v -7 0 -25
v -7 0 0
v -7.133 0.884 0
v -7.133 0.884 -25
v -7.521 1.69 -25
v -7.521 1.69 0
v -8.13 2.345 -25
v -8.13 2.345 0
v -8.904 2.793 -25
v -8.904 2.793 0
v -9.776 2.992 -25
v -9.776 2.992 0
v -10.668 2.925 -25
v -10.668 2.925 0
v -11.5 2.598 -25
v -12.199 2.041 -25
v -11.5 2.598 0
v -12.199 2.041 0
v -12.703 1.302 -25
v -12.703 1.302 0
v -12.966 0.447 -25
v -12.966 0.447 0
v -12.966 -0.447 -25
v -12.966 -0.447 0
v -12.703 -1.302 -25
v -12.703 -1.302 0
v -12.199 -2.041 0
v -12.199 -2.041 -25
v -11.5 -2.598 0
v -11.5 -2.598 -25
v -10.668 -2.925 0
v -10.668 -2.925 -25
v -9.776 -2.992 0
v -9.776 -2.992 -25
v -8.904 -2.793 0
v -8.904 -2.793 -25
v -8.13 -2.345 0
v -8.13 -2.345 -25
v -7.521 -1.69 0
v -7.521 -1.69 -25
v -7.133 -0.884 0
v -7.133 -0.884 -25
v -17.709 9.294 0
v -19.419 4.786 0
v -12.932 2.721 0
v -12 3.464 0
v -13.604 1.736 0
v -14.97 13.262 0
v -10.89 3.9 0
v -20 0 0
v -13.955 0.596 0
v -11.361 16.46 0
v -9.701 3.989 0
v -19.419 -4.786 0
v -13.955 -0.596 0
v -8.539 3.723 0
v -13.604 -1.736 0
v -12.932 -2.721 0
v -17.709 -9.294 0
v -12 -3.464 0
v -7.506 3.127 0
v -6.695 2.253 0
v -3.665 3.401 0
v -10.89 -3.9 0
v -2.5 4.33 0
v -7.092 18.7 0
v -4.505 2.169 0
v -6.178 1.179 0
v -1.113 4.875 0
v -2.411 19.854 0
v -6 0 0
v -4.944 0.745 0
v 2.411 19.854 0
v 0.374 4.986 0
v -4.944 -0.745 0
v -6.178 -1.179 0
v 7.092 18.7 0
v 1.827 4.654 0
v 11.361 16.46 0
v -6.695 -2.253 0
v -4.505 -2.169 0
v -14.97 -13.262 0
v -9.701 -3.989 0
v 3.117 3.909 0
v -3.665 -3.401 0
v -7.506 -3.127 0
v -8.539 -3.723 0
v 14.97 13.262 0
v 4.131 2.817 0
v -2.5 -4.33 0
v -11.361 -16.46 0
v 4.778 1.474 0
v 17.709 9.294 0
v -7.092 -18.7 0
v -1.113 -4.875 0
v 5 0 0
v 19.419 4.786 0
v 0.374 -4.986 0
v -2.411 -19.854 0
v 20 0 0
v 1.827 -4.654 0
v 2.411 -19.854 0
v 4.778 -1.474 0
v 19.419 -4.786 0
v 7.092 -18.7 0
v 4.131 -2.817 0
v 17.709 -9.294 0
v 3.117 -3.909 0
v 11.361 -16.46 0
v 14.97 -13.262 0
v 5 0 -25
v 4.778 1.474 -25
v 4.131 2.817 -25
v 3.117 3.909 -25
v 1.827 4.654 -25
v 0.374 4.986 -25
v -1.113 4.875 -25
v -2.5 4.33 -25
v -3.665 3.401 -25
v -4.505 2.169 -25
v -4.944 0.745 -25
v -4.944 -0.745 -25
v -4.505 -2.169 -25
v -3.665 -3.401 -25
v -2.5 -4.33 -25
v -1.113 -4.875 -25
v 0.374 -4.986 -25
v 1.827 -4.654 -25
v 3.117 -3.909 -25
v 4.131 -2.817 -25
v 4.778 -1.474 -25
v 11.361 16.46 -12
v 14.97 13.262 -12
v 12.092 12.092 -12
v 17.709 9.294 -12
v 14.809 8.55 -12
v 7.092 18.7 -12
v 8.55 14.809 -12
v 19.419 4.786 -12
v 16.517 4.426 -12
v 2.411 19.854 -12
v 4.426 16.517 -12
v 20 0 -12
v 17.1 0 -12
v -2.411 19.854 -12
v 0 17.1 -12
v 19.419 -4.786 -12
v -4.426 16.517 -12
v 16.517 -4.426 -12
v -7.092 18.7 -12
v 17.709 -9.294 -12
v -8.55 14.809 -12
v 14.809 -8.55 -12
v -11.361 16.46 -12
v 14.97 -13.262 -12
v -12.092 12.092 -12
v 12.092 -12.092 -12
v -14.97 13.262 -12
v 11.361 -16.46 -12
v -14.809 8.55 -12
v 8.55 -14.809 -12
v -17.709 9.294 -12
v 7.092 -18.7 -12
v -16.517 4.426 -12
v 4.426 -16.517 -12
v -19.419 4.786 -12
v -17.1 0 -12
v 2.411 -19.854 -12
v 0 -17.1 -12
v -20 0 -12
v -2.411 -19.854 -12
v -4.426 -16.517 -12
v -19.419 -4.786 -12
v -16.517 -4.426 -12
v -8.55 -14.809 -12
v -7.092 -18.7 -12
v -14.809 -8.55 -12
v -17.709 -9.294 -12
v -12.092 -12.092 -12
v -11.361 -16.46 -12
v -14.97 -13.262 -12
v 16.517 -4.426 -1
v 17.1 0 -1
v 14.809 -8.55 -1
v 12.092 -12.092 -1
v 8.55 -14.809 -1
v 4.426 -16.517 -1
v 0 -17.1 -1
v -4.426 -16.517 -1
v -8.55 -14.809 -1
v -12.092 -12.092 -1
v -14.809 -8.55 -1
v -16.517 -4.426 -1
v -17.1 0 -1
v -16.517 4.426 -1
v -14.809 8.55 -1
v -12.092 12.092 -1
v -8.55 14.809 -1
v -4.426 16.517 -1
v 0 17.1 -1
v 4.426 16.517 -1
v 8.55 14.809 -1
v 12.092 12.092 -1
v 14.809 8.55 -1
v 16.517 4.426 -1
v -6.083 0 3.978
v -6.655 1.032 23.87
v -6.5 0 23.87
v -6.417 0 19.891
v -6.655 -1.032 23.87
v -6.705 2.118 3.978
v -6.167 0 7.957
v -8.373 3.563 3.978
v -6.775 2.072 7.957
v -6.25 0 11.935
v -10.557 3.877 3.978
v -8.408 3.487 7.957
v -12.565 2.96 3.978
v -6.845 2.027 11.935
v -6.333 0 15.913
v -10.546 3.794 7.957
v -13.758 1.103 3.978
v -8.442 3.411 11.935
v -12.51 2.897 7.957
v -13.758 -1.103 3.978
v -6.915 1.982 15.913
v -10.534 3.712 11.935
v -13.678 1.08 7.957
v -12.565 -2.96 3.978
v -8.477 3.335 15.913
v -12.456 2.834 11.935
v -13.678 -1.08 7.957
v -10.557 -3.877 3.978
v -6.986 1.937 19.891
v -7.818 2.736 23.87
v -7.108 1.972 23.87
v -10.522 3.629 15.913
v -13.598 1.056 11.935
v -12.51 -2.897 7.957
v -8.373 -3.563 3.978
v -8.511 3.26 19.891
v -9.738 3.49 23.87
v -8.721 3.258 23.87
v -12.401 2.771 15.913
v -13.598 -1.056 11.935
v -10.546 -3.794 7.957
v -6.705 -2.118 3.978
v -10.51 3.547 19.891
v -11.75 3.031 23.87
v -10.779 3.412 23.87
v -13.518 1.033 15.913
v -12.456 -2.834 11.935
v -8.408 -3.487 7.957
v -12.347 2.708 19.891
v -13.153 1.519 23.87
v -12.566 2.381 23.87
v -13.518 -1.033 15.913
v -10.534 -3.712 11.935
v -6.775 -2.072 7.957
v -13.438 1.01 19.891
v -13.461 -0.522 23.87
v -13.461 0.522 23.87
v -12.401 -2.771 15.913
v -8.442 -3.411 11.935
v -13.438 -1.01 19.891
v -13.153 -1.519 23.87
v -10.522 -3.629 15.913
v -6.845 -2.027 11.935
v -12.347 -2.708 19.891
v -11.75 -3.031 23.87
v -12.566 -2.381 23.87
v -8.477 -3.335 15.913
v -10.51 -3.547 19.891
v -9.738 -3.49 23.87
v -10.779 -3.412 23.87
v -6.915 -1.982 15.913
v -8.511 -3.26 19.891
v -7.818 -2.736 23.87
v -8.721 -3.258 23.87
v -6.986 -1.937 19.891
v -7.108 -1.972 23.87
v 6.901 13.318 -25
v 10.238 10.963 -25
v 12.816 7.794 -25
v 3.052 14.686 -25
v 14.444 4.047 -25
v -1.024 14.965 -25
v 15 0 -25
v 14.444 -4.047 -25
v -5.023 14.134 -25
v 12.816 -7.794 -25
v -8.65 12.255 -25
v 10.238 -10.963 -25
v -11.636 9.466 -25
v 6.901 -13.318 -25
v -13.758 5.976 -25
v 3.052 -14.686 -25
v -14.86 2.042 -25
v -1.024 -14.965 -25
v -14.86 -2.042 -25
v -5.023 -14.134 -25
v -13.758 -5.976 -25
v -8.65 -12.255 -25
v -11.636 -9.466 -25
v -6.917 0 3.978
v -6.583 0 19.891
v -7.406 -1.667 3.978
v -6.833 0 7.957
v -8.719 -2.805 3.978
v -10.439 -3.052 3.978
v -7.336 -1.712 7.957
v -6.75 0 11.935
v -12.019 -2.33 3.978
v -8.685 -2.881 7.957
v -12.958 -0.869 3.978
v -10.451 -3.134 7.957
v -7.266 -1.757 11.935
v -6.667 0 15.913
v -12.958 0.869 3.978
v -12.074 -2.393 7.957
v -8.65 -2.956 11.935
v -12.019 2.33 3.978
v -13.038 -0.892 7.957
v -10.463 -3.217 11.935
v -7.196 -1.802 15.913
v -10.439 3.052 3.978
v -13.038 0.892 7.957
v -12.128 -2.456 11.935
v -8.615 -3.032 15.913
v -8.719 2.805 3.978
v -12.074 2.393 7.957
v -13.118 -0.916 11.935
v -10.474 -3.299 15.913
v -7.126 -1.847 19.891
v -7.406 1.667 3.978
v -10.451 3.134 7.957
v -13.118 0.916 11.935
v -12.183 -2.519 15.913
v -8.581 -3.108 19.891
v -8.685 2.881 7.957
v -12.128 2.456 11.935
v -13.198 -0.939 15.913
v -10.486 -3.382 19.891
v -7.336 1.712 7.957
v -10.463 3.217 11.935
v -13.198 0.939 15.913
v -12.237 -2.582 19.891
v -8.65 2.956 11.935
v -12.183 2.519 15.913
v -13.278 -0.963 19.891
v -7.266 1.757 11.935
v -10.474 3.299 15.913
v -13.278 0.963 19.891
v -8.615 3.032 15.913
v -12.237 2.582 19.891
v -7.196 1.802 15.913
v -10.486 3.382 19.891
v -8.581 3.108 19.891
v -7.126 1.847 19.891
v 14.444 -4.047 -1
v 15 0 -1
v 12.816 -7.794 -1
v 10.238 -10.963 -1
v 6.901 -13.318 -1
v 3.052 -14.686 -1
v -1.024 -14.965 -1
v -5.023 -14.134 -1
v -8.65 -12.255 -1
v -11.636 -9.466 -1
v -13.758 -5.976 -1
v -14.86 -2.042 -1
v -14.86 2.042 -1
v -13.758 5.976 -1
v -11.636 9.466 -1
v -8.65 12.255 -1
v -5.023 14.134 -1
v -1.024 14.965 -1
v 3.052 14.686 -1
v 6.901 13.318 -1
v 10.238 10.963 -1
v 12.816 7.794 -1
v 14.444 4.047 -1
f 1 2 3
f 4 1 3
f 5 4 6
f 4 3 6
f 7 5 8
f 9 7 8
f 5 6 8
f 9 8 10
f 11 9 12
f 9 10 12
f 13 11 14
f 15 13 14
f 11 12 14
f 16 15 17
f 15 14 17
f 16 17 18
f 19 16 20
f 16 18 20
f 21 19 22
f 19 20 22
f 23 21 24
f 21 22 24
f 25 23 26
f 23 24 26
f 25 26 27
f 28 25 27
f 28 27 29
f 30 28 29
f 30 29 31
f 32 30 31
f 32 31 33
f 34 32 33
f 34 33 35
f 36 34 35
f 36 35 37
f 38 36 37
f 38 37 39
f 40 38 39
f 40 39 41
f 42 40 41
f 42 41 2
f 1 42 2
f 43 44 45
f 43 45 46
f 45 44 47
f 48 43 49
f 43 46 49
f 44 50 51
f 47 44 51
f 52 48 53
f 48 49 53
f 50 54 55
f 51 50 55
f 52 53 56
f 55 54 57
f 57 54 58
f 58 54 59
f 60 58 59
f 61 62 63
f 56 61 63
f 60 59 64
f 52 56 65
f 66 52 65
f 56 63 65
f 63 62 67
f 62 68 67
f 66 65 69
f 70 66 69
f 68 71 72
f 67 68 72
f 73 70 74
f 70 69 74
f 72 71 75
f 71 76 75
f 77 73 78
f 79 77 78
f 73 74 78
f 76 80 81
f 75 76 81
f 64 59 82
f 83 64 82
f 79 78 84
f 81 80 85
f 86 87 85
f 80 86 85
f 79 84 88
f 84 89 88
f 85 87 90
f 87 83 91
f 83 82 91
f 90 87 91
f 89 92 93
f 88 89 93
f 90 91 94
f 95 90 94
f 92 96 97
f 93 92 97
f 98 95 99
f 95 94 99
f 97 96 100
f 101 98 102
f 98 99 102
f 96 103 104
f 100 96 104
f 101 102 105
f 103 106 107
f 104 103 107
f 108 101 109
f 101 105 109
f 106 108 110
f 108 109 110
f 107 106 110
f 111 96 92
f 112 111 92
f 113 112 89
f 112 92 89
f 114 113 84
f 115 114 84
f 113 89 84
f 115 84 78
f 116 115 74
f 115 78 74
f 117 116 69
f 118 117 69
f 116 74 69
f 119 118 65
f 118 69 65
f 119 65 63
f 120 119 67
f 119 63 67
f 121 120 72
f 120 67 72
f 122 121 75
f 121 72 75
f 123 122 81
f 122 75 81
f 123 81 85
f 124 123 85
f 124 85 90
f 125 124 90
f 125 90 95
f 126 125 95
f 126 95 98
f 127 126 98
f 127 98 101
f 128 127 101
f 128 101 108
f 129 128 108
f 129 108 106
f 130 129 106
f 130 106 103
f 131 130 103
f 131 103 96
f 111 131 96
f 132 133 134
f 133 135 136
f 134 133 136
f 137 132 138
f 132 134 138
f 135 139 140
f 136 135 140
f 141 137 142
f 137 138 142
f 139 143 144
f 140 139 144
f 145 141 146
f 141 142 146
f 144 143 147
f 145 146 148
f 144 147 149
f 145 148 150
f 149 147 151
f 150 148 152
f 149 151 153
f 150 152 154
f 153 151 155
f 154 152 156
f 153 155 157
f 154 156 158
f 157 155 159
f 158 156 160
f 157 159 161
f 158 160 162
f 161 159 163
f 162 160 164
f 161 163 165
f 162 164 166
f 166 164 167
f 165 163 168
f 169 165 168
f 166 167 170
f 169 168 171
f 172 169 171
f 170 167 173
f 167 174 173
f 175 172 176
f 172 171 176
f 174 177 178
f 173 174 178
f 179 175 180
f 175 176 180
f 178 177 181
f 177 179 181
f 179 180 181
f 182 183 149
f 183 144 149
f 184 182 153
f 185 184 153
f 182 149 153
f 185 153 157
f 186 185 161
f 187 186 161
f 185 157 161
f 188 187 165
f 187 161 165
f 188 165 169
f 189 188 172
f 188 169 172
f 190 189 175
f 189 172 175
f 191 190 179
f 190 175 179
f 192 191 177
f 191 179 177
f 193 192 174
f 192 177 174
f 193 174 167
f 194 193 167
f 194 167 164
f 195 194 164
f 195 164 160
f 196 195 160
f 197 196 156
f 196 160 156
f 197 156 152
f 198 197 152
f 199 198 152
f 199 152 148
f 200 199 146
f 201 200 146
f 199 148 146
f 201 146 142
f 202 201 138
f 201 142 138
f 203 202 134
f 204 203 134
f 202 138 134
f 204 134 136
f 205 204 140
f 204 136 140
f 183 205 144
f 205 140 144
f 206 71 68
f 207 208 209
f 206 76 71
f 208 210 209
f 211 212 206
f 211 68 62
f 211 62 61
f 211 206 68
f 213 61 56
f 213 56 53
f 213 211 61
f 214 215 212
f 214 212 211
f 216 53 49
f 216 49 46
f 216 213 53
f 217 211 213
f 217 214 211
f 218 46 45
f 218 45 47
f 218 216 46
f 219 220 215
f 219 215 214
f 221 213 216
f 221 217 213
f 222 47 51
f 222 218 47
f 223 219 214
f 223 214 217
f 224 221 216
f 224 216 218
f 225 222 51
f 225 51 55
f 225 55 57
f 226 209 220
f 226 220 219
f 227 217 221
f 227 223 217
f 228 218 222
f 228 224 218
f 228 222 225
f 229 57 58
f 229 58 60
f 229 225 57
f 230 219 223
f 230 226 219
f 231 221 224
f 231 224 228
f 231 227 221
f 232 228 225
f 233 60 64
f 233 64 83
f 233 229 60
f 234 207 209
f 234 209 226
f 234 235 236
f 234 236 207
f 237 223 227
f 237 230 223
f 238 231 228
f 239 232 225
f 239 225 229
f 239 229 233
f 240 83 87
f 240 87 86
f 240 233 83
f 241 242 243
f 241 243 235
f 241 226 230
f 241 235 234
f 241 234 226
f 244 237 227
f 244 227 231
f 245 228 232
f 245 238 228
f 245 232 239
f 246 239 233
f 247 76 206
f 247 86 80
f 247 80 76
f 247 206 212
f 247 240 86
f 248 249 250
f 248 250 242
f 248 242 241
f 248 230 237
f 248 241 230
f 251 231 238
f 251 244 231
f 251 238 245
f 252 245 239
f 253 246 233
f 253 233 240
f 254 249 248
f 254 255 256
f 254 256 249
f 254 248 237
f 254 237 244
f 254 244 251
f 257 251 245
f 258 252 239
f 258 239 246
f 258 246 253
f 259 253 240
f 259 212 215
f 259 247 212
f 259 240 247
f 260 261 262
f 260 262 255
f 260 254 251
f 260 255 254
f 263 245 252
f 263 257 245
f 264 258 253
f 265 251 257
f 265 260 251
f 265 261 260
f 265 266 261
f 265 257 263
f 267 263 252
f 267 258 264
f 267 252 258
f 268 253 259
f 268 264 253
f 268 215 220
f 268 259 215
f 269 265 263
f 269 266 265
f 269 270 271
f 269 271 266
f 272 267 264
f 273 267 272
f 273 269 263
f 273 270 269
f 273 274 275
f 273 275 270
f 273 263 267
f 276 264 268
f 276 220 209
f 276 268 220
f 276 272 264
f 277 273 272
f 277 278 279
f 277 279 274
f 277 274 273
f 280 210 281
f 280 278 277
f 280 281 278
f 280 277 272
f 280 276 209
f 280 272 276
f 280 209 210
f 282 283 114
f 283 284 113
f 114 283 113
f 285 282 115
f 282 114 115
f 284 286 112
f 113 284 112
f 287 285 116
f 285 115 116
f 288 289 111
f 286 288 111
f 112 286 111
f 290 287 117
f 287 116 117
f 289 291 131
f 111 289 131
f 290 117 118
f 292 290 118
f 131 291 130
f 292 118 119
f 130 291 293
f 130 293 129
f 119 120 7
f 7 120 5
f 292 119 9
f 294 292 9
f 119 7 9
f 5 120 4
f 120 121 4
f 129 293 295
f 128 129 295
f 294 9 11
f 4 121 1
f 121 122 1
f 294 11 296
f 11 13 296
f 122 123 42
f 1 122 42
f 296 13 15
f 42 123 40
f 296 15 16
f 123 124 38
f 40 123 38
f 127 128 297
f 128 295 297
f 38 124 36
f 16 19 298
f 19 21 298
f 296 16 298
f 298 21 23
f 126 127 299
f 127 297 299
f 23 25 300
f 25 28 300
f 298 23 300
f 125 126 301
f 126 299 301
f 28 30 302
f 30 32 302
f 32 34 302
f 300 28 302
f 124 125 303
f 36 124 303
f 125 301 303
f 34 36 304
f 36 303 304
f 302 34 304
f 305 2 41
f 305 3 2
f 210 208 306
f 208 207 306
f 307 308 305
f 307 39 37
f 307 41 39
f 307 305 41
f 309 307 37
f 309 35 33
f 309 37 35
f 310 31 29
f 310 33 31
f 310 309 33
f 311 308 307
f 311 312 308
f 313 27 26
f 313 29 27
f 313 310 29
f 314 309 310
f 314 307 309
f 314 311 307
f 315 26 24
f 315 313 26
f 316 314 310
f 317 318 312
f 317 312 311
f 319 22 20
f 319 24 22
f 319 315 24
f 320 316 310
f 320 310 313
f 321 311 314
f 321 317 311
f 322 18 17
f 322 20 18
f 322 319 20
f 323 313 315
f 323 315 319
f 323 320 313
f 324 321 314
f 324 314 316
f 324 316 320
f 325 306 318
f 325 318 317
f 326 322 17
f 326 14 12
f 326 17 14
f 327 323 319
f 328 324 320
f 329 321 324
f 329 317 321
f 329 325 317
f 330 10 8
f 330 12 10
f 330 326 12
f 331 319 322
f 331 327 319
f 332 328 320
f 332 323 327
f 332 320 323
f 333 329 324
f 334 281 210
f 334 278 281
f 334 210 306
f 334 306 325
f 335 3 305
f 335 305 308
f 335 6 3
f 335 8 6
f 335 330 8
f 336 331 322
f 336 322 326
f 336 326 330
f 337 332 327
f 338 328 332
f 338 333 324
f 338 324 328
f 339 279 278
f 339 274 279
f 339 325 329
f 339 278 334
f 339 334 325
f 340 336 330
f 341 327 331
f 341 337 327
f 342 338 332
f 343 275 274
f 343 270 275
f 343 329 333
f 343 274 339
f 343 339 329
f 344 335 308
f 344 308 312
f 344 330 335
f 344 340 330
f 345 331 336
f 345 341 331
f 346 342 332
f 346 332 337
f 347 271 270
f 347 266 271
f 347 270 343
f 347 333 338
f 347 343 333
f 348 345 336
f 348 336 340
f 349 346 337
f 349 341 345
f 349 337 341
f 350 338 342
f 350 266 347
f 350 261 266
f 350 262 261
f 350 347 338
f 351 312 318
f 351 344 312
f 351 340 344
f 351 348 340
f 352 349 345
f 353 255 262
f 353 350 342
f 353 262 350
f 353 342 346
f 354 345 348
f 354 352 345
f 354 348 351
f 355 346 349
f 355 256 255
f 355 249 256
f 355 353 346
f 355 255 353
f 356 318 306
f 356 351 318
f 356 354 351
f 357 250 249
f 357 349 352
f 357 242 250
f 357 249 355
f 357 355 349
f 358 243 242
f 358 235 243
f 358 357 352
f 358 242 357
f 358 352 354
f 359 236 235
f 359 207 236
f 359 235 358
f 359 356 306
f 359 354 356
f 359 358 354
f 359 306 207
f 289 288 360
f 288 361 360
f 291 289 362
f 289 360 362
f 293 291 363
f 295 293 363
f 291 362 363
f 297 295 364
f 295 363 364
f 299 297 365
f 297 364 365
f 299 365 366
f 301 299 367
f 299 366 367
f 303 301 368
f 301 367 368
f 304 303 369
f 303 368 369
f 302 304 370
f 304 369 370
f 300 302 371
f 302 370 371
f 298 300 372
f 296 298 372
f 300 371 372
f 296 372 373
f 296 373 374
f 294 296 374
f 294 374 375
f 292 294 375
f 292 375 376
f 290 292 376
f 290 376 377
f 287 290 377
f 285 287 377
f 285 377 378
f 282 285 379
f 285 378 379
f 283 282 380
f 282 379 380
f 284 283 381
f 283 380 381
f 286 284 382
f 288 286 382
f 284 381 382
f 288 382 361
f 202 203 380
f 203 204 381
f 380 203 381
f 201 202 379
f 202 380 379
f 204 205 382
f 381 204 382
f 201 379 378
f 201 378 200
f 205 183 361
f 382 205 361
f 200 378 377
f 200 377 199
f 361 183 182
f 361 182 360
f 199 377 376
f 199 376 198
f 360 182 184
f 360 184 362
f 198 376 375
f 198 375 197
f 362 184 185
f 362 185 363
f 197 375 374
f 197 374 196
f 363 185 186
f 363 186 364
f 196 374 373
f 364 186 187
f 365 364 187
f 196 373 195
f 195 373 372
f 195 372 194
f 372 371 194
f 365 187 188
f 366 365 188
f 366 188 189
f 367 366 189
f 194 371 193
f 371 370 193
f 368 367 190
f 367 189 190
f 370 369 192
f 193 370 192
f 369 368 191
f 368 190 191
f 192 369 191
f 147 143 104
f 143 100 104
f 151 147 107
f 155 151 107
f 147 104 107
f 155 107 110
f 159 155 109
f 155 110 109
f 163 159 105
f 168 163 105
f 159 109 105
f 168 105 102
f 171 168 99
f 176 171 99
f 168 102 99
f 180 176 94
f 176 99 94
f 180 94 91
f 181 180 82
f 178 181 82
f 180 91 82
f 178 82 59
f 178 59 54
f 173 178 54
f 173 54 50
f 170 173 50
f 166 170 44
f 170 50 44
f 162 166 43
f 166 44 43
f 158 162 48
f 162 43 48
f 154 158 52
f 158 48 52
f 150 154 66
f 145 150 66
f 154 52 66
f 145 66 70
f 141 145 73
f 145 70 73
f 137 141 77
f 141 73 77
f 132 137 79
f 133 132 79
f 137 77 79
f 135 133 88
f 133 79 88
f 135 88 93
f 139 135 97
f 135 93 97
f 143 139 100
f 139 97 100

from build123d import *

# Parameters (mm, degrees)
F2_R     = 5
F3_DEPTH = 25.001
F4_R     = 3
F5_DEPTH = 25.001
F6_R     = 4
F6_R_2   = 3
F7_DEPTH = 25
F7_TAPER = 1.2


with BuildPart() as f1:
    # F0 (on Front) → F1 (revolve)
    with BuildSketch(Plane.XZ):
        Polygon((20, 0), (0, 0), (0, -25), (15, -25), (15, -1), (17.1, -1), (17.1, -12), (20, -12), align=None)
    revolve(axis=Axis((0, 0, -20.7611778751), (0, 0, -1)))

    # F2 (on Top) → F3 (cut, through all)
    with BuildSketch(Plane.XY):
        Circle(F2_R)
    extrude(amount=-F3_DEPTH, mode=Mode.SUBTRACT)

    # F4 (on face) → F5 (cut, through all)
    with BuildSketch(Plane.XY):
        with Locations((-10, 0)):
            Circle(F4_R)
    extrude(amount=-F5_DEPTH, mode=Mode.SUBTRACT)

    # F6 (on face) → F7 (join)
    with BuildSketch(Plane.XY):
        with Locations((-10, 0)):
            Circle(F6_R)
        with Locations((-10, 0)):
            Circle(F6_R_2, mode=Mode.SUBTRACT)
    extrude(amount=F7_DEPTH, taper=F7_TAPER)


solid = f1.part
